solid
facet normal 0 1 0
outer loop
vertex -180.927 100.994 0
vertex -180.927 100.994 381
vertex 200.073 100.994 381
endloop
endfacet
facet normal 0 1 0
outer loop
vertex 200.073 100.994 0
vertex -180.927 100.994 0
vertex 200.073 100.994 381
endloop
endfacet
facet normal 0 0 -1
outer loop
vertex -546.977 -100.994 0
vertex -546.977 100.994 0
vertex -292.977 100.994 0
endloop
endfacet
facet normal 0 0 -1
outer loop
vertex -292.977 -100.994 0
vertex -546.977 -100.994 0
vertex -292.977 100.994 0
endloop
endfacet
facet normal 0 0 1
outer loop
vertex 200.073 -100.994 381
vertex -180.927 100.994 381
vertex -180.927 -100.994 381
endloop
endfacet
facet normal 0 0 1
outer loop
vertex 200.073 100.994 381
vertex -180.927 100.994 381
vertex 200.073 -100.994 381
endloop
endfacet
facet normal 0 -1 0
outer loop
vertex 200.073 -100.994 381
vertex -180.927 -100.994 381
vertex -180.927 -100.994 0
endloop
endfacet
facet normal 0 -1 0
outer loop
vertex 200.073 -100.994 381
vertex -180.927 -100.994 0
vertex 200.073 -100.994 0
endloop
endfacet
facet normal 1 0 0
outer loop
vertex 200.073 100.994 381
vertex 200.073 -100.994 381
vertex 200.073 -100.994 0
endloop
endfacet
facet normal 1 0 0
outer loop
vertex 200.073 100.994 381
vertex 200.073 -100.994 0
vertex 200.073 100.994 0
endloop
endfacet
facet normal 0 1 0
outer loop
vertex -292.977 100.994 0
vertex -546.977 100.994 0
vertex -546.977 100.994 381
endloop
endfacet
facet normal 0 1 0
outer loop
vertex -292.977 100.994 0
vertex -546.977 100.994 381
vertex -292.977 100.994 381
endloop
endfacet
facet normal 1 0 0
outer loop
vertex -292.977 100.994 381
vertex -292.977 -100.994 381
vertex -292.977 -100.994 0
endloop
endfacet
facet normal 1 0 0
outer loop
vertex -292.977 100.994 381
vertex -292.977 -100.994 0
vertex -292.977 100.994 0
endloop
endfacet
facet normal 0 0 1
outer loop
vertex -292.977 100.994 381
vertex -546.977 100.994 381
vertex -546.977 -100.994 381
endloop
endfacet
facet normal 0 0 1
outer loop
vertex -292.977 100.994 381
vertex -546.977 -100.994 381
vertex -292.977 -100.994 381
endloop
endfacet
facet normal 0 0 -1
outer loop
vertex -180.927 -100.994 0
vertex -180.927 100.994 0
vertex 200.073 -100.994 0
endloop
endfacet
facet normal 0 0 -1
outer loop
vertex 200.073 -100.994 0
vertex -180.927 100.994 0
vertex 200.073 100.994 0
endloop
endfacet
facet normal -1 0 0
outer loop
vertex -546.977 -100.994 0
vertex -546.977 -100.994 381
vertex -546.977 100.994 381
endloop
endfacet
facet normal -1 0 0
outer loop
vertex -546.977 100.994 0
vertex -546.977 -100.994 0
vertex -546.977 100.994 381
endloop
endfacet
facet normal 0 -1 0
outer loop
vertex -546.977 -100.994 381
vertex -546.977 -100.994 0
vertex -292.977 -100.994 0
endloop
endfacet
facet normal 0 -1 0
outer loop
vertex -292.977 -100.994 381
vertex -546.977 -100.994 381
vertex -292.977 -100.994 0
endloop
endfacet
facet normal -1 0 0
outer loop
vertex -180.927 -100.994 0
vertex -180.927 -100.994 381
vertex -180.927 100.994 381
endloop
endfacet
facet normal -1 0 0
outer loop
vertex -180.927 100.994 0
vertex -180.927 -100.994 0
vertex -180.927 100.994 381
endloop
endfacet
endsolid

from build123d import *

# Parameters (mm, degrees)
F0_W     = 254
F0_H     = 201.987446
F0_W_2   = 381
F1_DEPTH = 381


with BuildPart() as f1:
    # F0 (on Top) → F1 (new body)
    with BuildSketch(Plane.XY):
        with Locations((-419.977341, 0)):
            Rectangle(F0_W, F0_H)
        with Locations((9.572864, 0)):
            Rectangle(F0_W_2, F0_H)
    extrude(amount=F1_DEPTH)


solid = f1.part
